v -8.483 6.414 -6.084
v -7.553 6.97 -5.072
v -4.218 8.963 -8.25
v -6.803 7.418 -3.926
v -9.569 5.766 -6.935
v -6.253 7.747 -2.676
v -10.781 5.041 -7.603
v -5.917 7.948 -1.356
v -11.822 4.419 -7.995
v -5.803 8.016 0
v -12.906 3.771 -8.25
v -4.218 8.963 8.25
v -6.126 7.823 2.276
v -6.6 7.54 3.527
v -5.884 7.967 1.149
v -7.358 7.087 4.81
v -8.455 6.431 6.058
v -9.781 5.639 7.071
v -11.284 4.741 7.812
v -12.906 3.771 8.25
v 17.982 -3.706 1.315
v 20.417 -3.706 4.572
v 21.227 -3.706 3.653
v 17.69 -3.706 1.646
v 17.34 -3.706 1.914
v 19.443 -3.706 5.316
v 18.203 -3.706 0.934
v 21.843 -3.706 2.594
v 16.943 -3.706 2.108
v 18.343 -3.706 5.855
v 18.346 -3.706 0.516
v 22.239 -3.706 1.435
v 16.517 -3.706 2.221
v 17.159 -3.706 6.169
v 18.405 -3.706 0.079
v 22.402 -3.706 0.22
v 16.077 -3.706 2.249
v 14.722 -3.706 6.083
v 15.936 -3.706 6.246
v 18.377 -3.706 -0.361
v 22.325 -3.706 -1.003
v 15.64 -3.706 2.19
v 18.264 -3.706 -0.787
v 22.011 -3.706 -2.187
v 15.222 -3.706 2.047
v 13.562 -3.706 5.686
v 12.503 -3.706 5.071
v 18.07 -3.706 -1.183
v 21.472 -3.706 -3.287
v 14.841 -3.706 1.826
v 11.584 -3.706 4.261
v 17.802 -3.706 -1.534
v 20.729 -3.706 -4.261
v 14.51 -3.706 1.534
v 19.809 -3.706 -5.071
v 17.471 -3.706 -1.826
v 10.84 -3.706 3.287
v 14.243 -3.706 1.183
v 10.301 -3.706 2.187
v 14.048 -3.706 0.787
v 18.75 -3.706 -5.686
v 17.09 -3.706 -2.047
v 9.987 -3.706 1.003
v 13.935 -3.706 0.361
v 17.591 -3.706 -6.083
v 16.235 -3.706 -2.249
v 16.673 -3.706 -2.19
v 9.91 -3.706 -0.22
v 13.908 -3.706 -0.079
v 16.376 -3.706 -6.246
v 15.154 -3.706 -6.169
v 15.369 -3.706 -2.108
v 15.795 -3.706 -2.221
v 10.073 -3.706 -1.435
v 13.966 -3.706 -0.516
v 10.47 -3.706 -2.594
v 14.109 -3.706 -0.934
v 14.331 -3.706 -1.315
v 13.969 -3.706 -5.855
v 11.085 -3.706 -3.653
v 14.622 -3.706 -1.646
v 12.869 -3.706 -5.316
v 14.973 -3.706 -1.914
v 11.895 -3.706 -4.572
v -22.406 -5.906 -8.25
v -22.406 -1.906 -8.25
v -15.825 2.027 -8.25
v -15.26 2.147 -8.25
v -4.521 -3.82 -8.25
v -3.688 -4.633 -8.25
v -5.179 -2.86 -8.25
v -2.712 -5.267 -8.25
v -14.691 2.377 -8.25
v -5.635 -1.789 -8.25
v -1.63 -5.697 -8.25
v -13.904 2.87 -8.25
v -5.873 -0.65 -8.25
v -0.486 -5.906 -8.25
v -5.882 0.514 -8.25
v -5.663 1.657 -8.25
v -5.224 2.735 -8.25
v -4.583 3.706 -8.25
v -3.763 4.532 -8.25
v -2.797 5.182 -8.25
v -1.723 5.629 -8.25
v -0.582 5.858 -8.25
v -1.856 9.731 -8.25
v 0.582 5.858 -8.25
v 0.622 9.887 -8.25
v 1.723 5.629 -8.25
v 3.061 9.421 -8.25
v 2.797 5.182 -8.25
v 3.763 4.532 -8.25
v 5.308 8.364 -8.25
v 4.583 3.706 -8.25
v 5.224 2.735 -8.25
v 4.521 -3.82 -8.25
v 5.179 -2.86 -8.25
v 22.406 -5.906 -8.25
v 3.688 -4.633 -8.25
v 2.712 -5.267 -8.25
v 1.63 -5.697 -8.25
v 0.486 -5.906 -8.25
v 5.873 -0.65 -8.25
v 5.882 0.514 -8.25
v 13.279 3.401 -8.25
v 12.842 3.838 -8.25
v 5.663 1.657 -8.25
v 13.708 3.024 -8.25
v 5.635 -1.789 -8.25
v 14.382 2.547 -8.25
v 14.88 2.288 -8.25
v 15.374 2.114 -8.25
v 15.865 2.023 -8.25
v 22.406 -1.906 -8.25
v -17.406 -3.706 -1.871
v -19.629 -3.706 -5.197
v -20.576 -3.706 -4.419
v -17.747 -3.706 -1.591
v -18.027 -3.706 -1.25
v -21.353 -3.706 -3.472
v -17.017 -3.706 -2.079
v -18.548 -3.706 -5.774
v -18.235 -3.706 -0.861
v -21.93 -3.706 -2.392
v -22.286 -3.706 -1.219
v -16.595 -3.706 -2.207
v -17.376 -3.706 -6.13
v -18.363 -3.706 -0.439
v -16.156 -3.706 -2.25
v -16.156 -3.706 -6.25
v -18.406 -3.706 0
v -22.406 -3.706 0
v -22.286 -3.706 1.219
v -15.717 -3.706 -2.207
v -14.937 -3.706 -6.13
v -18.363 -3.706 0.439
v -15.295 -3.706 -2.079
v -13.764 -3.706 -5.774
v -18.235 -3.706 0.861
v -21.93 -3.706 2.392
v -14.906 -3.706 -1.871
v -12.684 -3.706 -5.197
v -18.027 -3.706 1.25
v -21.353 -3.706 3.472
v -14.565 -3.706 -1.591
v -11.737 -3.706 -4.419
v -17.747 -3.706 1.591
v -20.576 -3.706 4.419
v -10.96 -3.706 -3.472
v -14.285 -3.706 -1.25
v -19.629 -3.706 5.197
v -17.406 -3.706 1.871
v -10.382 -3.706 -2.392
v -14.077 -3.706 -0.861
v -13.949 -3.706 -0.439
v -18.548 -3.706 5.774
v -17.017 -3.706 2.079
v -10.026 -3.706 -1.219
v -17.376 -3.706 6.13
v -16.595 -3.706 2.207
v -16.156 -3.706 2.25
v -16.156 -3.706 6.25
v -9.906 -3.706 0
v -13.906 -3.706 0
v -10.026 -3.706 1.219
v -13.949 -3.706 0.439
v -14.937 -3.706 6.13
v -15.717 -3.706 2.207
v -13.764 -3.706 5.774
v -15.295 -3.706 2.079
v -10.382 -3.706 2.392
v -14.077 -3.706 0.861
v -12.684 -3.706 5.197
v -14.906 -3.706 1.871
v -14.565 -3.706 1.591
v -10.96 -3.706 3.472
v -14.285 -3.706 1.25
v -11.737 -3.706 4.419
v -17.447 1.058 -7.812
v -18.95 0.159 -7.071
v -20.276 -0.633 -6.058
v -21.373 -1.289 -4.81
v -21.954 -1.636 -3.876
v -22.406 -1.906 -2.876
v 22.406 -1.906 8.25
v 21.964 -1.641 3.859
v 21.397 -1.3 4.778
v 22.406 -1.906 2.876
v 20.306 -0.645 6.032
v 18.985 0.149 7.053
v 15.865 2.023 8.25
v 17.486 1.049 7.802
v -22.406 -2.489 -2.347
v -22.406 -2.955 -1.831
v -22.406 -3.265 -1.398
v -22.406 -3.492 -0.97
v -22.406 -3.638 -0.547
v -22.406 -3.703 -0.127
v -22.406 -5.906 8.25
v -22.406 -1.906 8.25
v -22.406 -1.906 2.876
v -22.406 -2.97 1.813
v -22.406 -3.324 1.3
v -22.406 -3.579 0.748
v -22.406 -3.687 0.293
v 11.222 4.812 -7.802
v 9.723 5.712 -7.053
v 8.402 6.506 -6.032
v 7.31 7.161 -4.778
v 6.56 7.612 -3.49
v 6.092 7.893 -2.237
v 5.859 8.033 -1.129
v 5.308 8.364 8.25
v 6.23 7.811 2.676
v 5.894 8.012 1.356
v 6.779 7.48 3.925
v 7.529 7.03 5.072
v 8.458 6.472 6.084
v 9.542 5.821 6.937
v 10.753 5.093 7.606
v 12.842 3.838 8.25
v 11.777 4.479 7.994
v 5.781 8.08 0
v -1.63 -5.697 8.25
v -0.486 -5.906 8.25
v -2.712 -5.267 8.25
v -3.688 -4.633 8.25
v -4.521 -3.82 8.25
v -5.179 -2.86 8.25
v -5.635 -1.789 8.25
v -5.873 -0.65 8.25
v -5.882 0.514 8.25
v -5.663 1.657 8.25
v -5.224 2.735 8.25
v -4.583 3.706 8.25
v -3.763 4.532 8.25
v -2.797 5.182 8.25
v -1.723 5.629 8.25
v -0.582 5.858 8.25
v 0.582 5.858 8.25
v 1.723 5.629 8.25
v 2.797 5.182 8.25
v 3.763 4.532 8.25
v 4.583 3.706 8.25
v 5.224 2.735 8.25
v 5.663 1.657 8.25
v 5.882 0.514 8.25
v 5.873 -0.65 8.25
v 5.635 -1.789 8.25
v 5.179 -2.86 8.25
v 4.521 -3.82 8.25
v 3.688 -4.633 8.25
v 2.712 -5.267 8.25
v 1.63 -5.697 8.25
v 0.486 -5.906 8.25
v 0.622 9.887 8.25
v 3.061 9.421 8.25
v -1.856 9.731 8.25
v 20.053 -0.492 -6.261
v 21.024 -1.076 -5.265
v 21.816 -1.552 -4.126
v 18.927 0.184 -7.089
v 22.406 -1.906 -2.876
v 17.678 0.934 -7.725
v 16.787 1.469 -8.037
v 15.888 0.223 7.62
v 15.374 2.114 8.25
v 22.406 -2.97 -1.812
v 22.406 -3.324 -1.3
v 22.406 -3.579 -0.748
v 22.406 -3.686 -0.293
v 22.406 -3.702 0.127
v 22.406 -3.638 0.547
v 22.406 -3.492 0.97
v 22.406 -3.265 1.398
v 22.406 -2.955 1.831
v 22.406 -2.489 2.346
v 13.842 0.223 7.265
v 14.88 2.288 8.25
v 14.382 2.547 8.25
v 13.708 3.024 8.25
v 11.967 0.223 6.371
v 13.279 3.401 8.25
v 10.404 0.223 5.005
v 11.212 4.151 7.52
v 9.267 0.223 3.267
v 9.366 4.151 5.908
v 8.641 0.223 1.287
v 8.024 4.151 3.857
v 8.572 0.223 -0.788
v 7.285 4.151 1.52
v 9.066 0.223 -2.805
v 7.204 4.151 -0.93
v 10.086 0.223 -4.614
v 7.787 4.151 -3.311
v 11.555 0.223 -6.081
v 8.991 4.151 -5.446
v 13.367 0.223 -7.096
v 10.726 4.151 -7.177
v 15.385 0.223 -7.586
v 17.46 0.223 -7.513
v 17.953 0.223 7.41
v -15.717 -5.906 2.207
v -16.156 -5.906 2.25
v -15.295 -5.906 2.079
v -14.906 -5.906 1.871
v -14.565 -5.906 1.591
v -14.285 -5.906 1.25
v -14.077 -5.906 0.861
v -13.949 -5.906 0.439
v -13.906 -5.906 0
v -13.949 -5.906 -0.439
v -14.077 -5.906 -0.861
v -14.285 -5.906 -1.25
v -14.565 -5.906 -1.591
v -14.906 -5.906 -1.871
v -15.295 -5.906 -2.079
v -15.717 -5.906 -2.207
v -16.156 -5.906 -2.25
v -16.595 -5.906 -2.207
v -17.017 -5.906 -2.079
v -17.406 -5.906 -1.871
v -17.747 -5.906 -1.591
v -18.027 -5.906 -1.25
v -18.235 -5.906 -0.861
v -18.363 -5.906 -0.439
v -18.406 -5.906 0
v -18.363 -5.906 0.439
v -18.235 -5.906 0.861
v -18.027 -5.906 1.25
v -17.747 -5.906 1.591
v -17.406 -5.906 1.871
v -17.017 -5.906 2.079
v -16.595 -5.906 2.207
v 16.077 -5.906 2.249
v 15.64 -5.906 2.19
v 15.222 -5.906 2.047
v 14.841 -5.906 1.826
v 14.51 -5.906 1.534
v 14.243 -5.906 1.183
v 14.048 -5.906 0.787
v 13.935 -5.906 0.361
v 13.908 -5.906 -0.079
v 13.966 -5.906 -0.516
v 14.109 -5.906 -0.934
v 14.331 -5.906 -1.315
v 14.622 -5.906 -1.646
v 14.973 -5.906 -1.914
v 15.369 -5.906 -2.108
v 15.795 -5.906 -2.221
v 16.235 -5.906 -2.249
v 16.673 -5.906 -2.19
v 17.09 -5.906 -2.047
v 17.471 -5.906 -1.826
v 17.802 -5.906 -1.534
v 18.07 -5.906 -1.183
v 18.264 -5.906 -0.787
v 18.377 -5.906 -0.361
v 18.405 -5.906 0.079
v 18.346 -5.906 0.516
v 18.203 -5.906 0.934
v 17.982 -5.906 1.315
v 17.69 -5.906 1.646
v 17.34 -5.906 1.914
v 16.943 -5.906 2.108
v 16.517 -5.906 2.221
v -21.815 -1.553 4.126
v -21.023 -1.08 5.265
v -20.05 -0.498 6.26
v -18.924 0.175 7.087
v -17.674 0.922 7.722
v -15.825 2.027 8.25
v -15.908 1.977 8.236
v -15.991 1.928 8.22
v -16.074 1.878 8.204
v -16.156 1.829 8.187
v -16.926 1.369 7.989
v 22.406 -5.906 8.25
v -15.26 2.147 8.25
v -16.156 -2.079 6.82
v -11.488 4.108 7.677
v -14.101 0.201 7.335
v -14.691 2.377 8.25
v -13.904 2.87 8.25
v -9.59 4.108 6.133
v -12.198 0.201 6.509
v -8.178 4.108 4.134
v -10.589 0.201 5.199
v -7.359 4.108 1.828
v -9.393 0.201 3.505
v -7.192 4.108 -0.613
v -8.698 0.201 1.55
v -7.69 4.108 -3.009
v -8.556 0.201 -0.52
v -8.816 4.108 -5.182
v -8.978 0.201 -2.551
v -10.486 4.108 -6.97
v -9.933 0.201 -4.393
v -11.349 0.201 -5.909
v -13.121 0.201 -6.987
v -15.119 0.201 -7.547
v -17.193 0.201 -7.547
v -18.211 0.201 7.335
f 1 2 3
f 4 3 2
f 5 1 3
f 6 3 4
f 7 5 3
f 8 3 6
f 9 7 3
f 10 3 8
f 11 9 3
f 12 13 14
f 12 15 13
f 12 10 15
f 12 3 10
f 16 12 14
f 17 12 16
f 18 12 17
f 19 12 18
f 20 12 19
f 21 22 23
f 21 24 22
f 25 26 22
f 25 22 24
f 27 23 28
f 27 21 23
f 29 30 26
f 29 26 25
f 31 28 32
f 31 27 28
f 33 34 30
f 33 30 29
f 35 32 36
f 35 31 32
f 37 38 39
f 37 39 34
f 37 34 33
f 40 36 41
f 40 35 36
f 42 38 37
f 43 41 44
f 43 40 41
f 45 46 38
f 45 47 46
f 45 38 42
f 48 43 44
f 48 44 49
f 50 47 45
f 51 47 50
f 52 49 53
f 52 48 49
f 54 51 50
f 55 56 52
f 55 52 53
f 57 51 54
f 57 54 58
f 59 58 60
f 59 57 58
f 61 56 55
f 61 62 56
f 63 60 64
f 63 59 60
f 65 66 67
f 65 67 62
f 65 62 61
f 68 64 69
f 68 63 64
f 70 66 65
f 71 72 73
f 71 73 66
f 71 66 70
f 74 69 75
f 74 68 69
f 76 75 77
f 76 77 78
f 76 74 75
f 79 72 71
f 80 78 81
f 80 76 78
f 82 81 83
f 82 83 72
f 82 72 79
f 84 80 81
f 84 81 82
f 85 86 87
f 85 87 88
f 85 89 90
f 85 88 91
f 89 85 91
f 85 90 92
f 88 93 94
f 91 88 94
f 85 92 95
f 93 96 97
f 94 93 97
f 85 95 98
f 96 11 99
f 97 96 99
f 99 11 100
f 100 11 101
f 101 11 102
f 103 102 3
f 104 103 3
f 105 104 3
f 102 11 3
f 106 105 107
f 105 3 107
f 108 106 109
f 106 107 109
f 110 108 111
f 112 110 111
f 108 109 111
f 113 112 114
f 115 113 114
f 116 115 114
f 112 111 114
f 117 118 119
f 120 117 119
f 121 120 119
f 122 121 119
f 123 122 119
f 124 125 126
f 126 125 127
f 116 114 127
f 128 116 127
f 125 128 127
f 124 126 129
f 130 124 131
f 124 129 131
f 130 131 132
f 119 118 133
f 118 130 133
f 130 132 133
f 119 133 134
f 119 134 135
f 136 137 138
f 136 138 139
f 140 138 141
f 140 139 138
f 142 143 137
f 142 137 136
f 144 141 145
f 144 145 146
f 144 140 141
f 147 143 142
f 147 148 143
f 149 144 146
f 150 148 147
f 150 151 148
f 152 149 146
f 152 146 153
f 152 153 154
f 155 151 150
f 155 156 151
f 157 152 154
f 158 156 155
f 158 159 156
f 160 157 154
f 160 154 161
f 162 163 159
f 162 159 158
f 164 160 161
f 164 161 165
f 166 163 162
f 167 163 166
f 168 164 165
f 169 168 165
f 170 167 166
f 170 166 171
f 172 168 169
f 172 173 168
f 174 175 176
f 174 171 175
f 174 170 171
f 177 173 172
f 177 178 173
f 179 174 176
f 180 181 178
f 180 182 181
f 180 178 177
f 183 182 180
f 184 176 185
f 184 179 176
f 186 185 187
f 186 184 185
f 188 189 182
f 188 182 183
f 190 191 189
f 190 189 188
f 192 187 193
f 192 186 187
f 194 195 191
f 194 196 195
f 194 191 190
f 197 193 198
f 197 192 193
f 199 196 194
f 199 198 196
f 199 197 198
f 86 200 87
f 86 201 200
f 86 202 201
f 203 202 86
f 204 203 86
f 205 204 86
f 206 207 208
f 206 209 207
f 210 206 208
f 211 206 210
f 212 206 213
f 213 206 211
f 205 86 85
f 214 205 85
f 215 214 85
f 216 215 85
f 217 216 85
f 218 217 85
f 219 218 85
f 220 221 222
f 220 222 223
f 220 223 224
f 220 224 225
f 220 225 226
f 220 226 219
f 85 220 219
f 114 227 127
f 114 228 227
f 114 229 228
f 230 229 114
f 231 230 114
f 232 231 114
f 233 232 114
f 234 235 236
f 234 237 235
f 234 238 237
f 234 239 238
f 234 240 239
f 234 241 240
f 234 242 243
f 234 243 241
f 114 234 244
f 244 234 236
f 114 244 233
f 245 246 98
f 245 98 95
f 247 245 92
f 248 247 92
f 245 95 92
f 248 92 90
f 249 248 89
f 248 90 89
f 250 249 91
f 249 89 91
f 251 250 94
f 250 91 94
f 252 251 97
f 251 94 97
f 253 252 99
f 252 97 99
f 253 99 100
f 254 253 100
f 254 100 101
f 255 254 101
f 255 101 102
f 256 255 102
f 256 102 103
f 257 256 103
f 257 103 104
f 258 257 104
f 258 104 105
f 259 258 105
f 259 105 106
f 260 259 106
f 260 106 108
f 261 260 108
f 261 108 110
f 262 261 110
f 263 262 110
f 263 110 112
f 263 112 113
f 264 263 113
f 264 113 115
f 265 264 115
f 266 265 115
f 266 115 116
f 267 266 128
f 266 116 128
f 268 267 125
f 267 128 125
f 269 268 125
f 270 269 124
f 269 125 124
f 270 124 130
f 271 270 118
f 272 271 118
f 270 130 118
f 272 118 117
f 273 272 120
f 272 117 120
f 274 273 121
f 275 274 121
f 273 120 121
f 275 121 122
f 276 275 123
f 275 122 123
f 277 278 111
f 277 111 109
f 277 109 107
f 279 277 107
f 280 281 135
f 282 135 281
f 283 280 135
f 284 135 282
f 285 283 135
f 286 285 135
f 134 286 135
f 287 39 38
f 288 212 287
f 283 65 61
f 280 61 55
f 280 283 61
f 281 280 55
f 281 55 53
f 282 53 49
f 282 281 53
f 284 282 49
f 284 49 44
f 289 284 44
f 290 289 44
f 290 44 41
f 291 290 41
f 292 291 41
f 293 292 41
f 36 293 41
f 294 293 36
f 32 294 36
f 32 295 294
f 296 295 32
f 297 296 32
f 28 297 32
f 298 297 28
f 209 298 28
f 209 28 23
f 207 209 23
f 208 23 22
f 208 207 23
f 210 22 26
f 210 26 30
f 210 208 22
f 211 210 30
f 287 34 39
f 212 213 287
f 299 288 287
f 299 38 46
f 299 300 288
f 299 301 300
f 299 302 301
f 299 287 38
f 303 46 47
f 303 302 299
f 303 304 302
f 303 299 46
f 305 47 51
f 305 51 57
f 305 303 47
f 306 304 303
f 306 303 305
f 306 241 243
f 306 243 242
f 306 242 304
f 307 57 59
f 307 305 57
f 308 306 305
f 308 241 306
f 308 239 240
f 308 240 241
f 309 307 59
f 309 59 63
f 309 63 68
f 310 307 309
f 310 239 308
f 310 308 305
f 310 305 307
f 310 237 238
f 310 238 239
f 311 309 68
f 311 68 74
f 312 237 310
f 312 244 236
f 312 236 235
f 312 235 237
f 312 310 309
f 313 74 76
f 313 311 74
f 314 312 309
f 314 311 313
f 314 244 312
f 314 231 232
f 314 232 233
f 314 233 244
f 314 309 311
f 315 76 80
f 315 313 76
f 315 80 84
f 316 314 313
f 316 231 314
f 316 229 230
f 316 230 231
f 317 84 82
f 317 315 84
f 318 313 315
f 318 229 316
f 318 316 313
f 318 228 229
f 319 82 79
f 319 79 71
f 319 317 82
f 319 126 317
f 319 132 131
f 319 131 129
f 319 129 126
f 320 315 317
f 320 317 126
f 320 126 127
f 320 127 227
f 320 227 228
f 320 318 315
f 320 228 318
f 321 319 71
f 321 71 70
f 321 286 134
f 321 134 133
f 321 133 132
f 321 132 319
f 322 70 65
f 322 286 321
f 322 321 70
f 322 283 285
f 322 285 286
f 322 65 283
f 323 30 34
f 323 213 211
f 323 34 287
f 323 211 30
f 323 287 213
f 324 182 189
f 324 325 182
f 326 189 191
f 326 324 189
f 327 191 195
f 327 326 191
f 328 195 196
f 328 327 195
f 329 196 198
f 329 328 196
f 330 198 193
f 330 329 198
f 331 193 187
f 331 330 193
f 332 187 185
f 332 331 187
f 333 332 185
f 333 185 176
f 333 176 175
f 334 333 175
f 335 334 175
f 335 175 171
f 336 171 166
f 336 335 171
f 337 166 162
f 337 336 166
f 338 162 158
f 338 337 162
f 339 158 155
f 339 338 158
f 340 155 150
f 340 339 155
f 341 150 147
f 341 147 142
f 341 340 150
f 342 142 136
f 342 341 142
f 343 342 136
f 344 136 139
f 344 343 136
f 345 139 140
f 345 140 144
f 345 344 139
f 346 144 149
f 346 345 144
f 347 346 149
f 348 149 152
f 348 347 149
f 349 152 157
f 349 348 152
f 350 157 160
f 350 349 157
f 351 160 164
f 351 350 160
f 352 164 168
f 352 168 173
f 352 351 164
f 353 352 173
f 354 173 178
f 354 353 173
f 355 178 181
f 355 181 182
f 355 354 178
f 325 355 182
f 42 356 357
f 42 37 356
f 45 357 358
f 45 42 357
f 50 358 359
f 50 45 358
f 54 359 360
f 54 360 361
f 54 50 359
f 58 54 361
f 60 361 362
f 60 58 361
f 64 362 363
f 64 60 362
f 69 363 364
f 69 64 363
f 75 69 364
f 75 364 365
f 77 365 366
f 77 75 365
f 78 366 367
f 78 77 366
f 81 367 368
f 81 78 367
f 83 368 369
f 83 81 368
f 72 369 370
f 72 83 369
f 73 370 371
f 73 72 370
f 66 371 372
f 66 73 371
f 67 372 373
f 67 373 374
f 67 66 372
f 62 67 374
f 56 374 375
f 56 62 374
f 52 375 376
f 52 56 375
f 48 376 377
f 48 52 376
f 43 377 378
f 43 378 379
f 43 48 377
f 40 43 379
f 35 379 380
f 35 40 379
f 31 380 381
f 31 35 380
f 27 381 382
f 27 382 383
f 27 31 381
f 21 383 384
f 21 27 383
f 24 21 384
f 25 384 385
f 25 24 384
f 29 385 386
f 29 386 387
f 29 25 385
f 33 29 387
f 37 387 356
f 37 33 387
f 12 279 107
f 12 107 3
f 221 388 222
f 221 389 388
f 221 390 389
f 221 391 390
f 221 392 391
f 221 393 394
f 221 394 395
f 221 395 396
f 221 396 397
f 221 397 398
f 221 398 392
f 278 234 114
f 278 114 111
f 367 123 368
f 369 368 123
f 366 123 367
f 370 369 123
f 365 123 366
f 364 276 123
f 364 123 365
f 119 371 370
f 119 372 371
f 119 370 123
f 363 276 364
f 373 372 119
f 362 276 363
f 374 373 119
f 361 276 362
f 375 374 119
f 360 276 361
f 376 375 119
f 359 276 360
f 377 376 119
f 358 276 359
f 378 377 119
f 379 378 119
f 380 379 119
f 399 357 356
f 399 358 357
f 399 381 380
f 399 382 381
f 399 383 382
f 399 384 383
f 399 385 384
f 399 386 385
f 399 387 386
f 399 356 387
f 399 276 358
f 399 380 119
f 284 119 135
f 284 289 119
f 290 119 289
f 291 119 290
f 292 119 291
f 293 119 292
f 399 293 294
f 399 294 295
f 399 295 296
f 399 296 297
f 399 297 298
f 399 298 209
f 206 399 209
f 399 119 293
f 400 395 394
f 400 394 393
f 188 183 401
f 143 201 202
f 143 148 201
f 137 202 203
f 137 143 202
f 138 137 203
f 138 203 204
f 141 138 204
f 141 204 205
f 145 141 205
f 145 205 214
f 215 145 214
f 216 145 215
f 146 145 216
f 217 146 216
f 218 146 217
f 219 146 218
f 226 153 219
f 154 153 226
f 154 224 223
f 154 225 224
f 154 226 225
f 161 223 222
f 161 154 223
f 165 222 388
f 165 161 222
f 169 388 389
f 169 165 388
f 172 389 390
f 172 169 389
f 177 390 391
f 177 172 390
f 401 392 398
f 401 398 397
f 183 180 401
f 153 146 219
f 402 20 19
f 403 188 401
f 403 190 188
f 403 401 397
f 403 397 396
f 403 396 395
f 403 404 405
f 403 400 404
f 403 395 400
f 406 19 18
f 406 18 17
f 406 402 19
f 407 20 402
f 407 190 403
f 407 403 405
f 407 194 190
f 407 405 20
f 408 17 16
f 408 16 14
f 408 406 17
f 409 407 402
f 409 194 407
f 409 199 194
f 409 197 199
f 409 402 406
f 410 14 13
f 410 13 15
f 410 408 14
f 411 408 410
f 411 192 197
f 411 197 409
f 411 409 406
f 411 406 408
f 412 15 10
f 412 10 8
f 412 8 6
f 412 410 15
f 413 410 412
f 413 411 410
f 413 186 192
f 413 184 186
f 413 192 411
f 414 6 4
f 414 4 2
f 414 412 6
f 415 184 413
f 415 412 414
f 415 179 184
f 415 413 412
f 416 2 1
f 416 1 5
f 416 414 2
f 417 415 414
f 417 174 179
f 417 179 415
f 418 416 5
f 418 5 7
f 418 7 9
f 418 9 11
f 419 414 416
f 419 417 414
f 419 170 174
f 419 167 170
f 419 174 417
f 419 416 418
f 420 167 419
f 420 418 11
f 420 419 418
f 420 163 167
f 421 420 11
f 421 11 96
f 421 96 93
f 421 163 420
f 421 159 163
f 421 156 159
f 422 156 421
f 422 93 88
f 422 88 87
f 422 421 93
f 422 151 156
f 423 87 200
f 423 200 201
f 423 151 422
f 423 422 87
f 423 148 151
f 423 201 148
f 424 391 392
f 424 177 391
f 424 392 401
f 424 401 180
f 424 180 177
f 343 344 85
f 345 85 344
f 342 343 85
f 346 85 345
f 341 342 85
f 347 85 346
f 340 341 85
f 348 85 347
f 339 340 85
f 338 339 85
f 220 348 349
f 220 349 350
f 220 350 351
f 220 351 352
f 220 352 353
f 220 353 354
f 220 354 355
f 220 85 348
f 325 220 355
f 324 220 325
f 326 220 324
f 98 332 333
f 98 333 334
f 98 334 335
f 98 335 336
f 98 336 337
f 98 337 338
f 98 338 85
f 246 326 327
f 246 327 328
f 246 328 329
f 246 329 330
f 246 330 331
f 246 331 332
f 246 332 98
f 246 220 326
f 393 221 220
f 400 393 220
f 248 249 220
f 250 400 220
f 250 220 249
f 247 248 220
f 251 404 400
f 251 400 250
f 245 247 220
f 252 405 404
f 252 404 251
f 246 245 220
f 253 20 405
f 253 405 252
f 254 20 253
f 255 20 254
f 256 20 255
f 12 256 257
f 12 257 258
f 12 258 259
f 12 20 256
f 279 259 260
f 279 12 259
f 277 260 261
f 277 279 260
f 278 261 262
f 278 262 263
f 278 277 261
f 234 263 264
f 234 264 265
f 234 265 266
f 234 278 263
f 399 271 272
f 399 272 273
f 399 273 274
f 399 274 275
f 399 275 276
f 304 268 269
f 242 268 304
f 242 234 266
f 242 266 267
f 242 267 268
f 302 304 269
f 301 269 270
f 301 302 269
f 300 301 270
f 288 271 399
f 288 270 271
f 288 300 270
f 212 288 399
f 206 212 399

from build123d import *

# Parameters (mm, degrees)
BOSS_EXTRUDE1_DEPTH   = 16.5
M10_CLEARANCE_HOLE1_D = 11.8125


with BuildPart() as part:
    # Sketch1 → Boss-Extrude1 (new body)
    with BuildSketch(Plane.XY.offset(8.25)):
        Polygon((22.406299796, -1.906250123), (5.308030128, 8.36411953), (3.061199903, 9.42140007), (0.622018993, 9.886699677), (-1.856250048, 9.730779648), (-4.217879772, 8.963439941), (-22.406200409, -1.90625), (-22.406200409, -5.90625), (22.406299796, -5.90625), align=None)
    extrude(amount=-BOSS_EXTRUDE1_DEPTH)

    # Sketch2 → Cut-Revolve1 (revolve, cut)
    with BuildSketch(Plane.XY, mode=Mode.PRIVATE) as cut_revolve1_sk:
        Polygon((26.531393942, 8.080018406), (16.1562, 8.080018406), (16.1562, -5.90625), (18.4062, -5.90625), (18.4062, -3.70625), (22.4062, -3.70625), align=None)
    revolve(cut_revolve1_sk.sketch.rotate(Axis((16.1562, 8.080018406, 0), (0, -1, 0)), 92.019039349), axis=Axis((16.1562, 8.080018406, 0), (0, -1, 0)), mode=Mode.SUBTRACT)

    # Sketch3 → Cut-Revolve2 (revolve, cut)
    with BuildSketch(Plane(origin=(0, 0, 0), x_dir=(-1, 0, 0), z_dir=(0, 0, -1)), mode=Mode.PRIVATE) as cut_revolve2_sk:
        Polygon((13.9062, -5.90625), (16.1562, -5.90625), (16.1562, 8.015867372), (5.80345892, 8.015867372), (9.9062, -3.70625), (13.9062, -3.70625), align=None)
    revolve(cut_revolve2_sk.sketch.rotate(Axis((-16.1562, -5.90625, 0), (0, 1, 0)), 270), axis=Axis((-16.1562, -5.90625, 0), (0, 1, 0)), mode=Mode.SUBTRACT)

    # M10 Clearance Hole1 (through all)
    with Locations(Plane.XY.offset(8.25)):
        with Locations((0, -0.02)):
            Hole(M10_CLEARANCE_HOLE1_D / 2)


solid = part.part
